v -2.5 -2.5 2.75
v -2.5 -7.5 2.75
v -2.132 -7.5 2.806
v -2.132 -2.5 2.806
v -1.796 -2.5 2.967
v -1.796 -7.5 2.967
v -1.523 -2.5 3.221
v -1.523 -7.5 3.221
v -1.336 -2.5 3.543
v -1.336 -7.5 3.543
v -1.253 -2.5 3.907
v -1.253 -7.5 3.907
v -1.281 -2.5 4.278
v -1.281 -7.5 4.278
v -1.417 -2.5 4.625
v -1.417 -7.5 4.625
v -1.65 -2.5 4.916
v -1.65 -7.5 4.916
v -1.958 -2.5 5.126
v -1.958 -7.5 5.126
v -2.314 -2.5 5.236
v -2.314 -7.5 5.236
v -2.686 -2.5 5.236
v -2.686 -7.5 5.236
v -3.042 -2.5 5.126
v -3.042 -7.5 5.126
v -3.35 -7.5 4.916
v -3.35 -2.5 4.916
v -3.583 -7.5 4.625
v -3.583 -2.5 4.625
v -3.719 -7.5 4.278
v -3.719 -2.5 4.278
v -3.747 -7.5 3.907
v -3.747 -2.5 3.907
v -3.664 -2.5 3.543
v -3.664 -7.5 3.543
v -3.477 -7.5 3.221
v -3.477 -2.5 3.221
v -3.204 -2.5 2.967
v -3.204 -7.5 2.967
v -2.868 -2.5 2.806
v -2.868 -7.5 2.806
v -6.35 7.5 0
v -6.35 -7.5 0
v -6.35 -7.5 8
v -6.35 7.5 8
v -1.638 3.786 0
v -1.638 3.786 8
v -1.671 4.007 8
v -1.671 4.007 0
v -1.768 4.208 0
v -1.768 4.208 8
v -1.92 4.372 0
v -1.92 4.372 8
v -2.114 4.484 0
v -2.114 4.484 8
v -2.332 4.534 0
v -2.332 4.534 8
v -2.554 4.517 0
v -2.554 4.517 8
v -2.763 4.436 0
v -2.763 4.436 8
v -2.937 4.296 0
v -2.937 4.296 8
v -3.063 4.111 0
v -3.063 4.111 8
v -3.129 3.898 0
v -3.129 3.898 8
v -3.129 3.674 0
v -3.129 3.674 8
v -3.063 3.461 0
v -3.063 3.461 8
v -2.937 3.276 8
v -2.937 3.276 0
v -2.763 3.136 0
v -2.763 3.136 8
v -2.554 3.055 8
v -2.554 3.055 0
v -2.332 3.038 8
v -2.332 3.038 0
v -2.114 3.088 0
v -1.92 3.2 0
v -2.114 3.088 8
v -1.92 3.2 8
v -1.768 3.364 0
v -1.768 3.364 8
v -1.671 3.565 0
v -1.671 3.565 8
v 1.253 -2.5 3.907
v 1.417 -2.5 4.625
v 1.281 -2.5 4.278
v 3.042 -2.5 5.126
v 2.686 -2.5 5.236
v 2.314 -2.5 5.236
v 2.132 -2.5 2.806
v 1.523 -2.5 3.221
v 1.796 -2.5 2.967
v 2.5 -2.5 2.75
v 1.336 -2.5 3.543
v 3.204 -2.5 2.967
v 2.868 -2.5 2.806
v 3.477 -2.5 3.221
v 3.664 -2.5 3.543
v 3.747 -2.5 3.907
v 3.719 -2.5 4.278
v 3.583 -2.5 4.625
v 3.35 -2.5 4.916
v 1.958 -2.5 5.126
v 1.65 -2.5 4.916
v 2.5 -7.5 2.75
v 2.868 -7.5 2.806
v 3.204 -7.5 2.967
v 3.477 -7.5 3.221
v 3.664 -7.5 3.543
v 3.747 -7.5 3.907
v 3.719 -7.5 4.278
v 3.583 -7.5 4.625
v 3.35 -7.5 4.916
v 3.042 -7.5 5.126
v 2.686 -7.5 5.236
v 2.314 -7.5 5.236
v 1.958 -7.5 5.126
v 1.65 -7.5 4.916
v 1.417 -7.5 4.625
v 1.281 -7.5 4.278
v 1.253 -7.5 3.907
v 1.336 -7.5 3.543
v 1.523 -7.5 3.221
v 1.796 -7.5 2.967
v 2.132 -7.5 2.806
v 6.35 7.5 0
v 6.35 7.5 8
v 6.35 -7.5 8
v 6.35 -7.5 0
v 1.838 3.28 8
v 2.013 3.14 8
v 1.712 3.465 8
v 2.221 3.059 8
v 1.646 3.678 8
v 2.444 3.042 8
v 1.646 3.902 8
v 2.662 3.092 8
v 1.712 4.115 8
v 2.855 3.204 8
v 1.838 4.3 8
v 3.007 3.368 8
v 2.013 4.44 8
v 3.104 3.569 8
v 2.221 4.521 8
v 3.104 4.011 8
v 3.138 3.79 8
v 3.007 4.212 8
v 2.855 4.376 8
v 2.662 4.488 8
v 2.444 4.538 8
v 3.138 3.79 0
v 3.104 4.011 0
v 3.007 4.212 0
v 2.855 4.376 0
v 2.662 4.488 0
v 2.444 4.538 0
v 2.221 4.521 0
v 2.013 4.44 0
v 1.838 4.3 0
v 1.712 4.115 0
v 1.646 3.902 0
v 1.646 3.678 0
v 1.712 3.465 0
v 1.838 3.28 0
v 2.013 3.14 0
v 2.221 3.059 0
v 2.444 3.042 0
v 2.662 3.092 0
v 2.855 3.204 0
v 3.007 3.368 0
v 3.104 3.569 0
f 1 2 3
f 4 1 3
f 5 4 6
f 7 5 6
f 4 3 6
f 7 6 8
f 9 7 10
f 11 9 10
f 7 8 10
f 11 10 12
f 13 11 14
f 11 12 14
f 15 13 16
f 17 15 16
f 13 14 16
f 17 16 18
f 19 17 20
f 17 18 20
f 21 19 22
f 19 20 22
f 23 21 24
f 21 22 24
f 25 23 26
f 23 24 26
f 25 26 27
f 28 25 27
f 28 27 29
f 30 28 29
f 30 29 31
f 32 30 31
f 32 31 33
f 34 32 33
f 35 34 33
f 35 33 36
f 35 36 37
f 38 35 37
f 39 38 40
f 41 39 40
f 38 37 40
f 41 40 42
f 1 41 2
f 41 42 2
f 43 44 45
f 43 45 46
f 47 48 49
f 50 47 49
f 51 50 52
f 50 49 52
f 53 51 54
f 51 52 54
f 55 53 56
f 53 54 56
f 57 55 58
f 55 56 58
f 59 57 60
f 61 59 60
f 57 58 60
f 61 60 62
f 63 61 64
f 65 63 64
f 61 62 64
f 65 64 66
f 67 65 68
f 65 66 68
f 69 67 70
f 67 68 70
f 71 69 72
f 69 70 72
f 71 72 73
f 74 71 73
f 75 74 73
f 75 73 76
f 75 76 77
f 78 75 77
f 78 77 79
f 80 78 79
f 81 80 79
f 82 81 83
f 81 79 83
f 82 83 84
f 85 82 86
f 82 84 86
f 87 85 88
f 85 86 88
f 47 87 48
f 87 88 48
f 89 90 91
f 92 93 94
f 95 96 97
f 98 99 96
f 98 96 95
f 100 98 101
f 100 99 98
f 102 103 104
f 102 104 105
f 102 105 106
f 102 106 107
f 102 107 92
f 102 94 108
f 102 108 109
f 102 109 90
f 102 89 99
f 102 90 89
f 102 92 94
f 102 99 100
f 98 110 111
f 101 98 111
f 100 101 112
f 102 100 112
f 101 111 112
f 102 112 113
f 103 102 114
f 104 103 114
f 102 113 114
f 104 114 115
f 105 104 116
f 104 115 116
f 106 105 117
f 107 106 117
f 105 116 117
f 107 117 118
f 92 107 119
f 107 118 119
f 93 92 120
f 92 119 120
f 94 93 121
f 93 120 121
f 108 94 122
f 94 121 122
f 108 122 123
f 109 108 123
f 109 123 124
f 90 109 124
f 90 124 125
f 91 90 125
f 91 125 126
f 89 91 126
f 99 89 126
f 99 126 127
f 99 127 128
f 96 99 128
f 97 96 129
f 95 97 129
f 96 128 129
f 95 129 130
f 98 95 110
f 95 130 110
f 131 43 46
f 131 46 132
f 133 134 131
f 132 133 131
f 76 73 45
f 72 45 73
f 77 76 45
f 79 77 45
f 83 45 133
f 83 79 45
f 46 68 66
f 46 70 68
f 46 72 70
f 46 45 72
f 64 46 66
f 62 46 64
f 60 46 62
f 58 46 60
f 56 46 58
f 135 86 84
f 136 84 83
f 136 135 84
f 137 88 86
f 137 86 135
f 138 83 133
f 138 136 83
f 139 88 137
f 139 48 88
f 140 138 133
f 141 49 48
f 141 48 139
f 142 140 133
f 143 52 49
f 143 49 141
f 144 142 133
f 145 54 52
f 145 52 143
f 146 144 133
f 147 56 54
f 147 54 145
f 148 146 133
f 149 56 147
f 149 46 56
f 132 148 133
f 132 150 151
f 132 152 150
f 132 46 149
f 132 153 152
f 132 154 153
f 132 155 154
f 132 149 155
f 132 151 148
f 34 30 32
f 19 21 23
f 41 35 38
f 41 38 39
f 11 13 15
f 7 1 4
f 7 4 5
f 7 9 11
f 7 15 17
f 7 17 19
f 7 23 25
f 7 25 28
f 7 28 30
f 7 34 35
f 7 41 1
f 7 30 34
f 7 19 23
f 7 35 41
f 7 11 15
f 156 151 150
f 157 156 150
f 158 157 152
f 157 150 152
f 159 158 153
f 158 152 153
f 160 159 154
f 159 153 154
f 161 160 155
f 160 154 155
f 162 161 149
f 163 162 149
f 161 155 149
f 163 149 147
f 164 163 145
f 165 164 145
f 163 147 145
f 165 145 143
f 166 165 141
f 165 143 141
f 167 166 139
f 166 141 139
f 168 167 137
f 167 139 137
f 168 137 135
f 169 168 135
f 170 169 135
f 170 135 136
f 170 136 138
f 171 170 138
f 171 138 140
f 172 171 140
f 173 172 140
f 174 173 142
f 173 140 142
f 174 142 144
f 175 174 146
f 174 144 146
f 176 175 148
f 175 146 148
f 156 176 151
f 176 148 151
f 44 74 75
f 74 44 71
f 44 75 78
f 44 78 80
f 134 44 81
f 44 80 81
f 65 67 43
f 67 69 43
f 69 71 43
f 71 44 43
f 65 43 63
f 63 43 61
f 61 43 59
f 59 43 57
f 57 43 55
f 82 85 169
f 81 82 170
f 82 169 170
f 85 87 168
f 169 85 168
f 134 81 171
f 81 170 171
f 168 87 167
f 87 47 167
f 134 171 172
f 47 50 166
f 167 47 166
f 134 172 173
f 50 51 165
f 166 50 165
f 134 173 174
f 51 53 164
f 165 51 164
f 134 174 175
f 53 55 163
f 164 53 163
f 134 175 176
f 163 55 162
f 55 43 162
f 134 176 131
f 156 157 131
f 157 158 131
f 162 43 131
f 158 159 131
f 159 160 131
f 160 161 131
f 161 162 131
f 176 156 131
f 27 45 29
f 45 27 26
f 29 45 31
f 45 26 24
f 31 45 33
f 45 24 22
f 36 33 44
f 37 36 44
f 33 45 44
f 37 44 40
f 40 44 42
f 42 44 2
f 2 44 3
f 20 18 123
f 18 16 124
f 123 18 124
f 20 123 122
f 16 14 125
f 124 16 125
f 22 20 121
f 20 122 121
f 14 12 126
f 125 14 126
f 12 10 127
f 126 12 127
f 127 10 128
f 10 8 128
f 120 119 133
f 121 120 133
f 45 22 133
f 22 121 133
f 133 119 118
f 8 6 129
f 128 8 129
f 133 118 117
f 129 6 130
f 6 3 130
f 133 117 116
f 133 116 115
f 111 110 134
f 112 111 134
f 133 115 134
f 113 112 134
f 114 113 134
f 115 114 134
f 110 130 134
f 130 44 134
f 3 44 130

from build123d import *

# Parameters (mm, degrees)
SKETCH_1_W          = 12.7
SKETCH_1_H          = 15
EXTRUDE_1_DEPTH     = 8
SKETCH_2_R          = 0.75
CUT_EXTRUDE_1_DEPTH = 8
SKETCH_3_R          = 1.25
CUT_EXTRUDE_2_DEPTH = 5


with BuildPart() as part:
    # Эскиз1 → Бобышка-Вытянуть1 (new body)
    with BuildSketch(Plane.XY):
        Rectangle(SKETCH_1_W, SKETCH_1_H)
    extrude(amount=EXTRUDE_1_DEPTH)

    # Эскиз2 → Вырез-Вытянуть1 (cut)
    with BuildSketch(Plane.XY.offset(8)):
        with Locations((-2.3876, 3.786)):
            Circle(SKETCH_2_R)
        with Locations((2.3876, 3.79)):
            Circle(SKETCH_2_R)
    extrude(amount=-CUT_EXTRUDE_1_DEPTH, mode=Mode.SUBTRACT)

    # Эскиз3 → Вырез-Вытянуть2 (cut)
    with BuildSketch(Plane.XZ.offset(7.5)):
        with Locations(Location((-2.5, 4, 0), (0, 0, 270))):
            Circle(SKETCH_3_R)
        with Locations(Location((2.5, 4, 0), (0, 0, 270))):
            Circle(SKETCH_3_R)
    extrude(amount=-CUT_EXTRUDE_2_DEPTH, mode=Mode.SUBTRACT)


solid = part.part
